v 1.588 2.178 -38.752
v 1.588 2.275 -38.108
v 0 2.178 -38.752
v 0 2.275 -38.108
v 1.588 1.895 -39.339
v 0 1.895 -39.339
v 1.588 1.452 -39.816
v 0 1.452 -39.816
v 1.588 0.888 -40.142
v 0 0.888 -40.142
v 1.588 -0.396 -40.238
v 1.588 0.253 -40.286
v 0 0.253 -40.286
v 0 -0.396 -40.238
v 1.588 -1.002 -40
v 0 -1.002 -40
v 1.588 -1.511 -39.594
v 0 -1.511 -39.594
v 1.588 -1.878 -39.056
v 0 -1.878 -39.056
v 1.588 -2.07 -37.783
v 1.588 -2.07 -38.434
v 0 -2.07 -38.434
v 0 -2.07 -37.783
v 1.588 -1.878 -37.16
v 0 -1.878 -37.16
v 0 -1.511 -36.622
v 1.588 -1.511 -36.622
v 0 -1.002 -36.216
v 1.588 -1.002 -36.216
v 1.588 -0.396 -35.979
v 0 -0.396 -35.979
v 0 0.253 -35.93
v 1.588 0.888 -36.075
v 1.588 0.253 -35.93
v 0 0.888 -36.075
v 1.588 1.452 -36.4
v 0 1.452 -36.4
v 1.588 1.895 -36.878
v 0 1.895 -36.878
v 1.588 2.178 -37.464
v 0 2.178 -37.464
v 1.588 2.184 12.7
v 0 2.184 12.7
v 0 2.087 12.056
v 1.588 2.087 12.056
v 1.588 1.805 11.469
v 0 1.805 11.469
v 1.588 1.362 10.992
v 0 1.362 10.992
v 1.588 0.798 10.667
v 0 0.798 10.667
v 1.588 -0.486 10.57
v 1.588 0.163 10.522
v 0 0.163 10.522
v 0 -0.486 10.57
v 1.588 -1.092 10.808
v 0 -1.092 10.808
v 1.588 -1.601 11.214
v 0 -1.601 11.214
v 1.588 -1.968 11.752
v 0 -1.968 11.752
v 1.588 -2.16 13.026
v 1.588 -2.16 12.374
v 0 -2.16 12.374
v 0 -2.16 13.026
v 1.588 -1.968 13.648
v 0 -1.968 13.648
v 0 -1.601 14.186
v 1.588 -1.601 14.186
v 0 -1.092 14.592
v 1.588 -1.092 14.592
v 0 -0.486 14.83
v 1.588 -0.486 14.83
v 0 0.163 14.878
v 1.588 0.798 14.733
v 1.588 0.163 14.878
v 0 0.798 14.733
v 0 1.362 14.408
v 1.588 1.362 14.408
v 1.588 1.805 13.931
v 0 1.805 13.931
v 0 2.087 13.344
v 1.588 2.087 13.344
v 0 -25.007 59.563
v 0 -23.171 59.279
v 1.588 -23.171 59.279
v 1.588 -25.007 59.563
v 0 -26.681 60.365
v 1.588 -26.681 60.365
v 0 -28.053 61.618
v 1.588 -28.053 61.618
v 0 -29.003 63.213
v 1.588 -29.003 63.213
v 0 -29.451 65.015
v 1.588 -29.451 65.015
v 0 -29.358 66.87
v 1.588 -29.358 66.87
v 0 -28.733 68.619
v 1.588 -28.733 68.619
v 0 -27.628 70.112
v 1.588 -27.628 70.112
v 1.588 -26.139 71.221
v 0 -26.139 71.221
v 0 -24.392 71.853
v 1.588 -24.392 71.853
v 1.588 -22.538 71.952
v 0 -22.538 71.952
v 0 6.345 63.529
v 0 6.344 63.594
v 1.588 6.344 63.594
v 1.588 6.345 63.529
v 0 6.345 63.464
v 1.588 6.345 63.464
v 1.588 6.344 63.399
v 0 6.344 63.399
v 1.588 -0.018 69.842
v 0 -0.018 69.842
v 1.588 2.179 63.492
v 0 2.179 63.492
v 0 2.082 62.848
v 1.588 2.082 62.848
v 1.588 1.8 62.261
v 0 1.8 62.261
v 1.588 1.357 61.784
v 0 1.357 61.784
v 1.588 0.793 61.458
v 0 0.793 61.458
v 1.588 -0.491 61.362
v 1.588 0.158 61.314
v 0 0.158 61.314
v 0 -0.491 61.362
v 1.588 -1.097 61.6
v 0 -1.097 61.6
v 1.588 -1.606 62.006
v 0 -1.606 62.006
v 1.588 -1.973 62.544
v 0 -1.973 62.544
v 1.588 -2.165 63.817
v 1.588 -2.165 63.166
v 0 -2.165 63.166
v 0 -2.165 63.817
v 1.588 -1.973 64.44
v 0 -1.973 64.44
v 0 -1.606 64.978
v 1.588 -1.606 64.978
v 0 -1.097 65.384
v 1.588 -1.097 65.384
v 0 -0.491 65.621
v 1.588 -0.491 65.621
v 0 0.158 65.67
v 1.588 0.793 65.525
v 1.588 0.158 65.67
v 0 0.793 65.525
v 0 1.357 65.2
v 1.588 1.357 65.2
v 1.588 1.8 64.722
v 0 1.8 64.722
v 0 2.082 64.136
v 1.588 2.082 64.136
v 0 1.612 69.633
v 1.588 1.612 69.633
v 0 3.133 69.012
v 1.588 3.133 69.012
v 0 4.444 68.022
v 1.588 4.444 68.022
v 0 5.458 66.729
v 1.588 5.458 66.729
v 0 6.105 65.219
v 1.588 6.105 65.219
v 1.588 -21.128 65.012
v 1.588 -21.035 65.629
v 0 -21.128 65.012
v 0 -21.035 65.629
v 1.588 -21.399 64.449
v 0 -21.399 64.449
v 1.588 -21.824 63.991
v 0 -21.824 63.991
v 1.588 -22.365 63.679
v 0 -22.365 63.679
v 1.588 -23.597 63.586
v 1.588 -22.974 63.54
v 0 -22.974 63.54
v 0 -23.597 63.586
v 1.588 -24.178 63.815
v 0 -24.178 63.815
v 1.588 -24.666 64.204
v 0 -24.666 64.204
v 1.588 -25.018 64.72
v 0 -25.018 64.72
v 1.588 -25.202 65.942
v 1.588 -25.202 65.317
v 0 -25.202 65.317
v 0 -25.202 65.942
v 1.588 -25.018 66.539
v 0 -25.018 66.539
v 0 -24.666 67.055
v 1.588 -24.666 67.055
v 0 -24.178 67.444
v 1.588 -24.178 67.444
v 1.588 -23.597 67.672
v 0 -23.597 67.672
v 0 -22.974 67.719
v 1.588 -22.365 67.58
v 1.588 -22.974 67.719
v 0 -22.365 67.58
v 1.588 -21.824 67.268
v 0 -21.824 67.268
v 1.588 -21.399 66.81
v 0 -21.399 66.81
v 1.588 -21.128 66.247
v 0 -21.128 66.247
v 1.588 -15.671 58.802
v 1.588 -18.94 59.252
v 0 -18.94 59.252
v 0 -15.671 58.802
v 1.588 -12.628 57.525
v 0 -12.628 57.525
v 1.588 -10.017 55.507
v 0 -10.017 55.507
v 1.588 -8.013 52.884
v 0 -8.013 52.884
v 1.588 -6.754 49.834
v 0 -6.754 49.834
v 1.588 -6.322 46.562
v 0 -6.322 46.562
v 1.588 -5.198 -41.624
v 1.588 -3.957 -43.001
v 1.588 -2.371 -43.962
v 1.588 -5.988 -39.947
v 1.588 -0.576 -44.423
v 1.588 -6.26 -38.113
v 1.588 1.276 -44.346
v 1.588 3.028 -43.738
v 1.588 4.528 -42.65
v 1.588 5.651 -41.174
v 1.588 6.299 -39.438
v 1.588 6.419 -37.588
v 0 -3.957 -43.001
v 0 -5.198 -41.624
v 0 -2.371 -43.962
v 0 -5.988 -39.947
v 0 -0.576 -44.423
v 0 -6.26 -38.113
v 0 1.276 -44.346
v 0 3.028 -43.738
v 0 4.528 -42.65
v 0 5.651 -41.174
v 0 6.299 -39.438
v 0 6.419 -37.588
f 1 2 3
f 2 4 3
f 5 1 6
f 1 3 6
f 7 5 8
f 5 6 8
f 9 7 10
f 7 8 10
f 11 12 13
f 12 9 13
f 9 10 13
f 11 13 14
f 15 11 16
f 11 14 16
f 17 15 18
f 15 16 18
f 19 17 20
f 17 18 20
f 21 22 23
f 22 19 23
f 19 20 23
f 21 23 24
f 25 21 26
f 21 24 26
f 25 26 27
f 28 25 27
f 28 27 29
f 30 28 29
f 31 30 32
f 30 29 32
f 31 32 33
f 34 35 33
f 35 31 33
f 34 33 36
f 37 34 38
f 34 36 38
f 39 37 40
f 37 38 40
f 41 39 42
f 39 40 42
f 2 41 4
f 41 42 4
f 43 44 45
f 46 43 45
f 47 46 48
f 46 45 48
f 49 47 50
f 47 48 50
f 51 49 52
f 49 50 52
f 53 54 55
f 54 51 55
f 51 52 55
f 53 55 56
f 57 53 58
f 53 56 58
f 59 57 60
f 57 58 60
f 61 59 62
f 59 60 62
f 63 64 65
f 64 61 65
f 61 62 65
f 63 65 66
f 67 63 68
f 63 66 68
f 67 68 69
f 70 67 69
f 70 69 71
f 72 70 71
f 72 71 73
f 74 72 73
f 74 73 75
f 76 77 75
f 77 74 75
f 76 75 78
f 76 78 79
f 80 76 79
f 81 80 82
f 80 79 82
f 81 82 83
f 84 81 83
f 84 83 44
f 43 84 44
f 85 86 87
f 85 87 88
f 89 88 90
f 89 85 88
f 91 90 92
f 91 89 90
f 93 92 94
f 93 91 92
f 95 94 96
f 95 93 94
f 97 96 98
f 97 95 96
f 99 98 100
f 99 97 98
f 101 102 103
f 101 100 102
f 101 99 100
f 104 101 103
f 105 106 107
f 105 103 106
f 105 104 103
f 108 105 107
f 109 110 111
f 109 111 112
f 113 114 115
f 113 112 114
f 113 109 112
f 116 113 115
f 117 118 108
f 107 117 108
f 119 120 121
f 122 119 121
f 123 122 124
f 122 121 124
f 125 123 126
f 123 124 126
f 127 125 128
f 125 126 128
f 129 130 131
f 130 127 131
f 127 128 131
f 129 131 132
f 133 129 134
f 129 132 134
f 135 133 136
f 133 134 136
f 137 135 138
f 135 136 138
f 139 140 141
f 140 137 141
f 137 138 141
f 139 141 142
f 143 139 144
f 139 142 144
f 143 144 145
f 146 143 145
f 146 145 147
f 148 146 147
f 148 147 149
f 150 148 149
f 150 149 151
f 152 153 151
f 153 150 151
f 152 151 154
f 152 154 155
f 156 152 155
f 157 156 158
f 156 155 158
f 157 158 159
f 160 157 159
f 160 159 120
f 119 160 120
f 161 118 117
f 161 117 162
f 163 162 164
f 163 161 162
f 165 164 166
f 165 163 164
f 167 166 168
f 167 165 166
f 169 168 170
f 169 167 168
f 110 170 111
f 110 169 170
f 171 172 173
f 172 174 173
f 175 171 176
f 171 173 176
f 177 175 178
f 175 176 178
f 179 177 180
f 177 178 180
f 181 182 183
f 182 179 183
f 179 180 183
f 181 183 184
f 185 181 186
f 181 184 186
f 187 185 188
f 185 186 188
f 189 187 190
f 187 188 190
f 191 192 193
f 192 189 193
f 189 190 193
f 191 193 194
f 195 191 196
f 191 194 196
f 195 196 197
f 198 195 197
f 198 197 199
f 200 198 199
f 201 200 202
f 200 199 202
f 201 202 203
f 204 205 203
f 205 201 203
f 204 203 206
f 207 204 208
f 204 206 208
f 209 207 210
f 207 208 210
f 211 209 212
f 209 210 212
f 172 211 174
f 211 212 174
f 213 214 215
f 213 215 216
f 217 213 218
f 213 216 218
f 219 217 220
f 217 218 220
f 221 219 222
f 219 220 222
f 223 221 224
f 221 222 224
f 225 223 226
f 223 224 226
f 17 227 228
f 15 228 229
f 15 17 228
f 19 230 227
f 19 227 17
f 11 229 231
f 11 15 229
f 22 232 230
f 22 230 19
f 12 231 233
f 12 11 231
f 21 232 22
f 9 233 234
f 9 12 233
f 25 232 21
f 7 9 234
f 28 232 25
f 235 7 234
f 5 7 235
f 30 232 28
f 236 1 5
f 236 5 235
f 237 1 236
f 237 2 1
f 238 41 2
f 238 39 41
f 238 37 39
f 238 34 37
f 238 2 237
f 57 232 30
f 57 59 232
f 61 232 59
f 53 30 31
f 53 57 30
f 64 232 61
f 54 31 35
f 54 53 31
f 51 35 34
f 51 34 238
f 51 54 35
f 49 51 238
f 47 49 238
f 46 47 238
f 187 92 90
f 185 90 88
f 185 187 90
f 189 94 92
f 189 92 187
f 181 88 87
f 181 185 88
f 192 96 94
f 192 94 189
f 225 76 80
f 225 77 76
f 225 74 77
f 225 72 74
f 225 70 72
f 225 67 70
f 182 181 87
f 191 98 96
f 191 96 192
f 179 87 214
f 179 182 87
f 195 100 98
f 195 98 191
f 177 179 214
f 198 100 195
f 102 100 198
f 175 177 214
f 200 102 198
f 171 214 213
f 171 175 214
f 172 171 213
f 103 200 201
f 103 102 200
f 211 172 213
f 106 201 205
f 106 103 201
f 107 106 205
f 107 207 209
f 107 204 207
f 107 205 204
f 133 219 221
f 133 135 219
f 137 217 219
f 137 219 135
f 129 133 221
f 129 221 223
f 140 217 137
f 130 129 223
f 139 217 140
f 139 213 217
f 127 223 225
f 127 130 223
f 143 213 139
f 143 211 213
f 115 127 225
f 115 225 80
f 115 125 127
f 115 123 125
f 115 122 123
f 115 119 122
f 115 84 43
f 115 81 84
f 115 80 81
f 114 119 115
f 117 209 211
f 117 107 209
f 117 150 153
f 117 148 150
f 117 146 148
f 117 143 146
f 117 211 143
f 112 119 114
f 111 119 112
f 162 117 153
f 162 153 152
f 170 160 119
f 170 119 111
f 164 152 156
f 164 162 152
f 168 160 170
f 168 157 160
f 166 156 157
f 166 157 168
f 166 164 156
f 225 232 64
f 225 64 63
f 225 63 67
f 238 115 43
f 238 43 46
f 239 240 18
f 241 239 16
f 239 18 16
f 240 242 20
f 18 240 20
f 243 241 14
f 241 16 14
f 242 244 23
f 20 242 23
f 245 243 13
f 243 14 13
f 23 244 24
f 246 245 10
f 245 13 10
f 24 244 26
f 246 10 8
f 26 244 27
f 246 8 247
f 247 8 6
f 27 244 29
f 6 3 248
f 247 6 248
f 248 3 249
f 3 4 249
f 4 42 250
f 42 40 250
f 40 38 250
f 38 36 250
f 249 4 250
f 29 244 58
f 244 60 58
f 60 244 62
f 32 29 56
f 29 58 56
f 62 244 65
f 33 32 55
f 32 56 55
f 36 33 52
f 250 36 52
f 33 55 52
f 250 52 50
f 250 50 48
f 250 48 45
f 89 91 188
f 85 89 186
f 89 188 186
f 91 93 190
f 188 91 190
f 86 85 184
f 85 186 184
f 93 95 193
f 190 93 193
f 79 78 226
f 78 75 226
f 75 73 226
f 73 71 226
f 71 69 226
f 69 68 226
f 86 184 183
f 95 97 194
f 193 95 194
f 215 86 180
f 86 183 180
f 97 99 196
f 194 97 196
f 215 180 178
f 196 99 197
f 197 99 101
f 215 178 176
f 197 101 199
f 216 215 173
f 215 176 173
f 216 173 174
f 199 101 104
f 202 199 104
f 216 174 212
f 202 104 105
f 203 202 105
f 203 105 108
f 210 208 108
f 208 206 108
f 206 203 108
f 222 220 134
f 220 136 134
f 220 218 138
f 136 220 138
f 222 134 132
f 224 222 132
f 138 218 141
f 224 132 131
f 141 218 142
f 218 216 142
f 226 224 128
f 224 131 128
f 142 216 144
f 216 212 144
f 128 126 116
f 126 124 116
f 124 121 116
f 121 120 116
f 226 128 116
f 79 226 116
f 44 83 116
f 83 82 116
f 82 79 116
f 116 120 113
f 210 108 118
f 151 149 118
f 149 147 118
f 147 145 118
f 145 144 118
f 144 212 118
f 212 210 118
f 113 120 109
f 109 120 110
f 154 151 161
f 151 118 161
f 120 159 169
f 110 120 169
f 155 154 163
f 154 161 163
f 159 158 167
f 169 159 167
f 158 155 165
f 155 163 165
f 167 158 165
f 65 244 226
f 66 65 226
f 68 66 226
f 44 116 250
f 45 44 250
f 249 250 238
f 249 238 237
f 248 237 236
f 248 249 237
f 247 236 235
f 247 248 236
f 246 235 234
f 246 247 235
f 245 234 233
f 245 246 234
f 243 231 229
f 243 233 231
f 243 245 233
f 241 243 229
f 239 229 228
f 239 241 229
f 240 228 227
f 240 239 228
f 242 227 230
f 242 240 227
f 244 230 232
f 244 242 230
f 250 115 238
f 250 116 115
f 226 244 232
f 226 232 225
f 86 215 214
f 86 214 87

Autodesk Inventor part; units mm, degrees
ref_plane "YZ Plane" through (0, 0, 0) normal (1, 0, 0) x (0, 1, 0)
ref_plane "XZ Plane" through (0, 0, 0) normal (0, 1, 0) x (-1, 0, 0)
ref_plane "XY Plane" through (0, 0, 0) normal (0, 0, 1) x (1, 0, 0)
sketch "main" plane through (0, 0, 0) normal (0, 0, 1) x (1, 0, 0)
  circle A0 centre (33.3097, -13.5548) radius 2.1844
  arc A1 (33.2126, -19.9041) -> (39.6597, -13.5466) centre (33.3097, -13.5548) ccw
  arc A2 (41.7862, 8.9717) -> (29.1145, 9.6144) centre (35.4643, 9.5687) ccw
  line L0 (39.6597, -13.5466) -> (41.7862, 8.9717)
  line L1 (-68.2903, -7.2251) -> (16.3844, -7.2251)
  line L2 (29.0841, 5.3837) -> (29.1145, 9.6144)
  arc A3 (16.3844, -7.2251) -> (29.0841, 5.3837) centre (16.3844, 5.4749) ccw
  circle A4 centre (35.4643, 9.5687) radius 2.0955
  line L3 (33.4068, -19.9041) -> (-67.7743, -19.9041)
  circle A5 centre (-68.2903, -13.5751) radius 2.1844
  circle A6 centre (-17.4821, -13.5224) radius 2.1844
  arc A7 (-68.2903, -7.2251) -> (-67.7743, -19.9041) centre (-68.2903, -13.5751) ccw
  point P0 (20.4908, -8.19)
  dimension "d0" = 12.7
  dimension "d1" = 12.7
  dimension "d2" = 12.7
  dimension "d3" = 4.191
  dimension "d7" = 4.3688
  dimension "d8" = 4.3688
  dimension "d9" = 12.7
sketch "Sketch1" plane through (0, 0, 0) normal (1, 0, 0) x (0, 1, 0)
  circle A0 centre (-0.0052, 63.4918) radius 2.1844
  arc A1 (6.3442, 63.3994) -> (-0.0181, 69.8418) centre (-0.0052, 63.4918) ccw
  arc A2 (-22.538, 71.9516) -> (-23.1712, 59.2794) centre (-23.1303, 65.6293) ccw
  line L0 (-0.0181, 69.8418) -> (-22.538, 71.9516)
  line L1 (-6.2598, -38.1129) -> (-6.3224, 46.5618)
  line L2 (-18.9405, 59.2522) -> (-23.1712, 59.2794)
  arc A3 (-6.3224, 46.5618) -> (-18.9405, 59.2522) centre (-19.0224, 46.5524) ccw
  circle A4 centre (-23.1303, 65.6293) radius 2.0955
  line L3 (6.344, 63.5936) -> (6.4188, -37.5875)
  circle A5 centre (0.0902, -38.1082) radius 2.1844
  circle A6 centre (0, 12.7) radius 2.1844
  arc A7 (-6.2598, -38.1129) -> (6.4188, -37.5875) centre (0.0902, -38.1082) ccw
  point P0 (0, 0)
extrude "Extrusion1" add sketch "Sketch1" along normal blind 1.5875
equation "\"BendRadius\" = Thickness"
equation "\"BendReliefWidth\" = Thickness"
equation "\"BendReliefDepth\" = 0.5 * Thickness"
equation "\"CornerReliefSize\" = 4 * Thickness"
equation "\"MinimumRemnant\" = 2 * Thickness"
equation "\"TransitionRadius\" = BendRadius"
equation "\"JacobiRadiusSize\" = BendRadius"
equation "\"GapSize\" = Thickness"
equation "\"Thickness\" = 1.5875"
properties part number "Passive Gusset" material "Acetal Resin, White"
